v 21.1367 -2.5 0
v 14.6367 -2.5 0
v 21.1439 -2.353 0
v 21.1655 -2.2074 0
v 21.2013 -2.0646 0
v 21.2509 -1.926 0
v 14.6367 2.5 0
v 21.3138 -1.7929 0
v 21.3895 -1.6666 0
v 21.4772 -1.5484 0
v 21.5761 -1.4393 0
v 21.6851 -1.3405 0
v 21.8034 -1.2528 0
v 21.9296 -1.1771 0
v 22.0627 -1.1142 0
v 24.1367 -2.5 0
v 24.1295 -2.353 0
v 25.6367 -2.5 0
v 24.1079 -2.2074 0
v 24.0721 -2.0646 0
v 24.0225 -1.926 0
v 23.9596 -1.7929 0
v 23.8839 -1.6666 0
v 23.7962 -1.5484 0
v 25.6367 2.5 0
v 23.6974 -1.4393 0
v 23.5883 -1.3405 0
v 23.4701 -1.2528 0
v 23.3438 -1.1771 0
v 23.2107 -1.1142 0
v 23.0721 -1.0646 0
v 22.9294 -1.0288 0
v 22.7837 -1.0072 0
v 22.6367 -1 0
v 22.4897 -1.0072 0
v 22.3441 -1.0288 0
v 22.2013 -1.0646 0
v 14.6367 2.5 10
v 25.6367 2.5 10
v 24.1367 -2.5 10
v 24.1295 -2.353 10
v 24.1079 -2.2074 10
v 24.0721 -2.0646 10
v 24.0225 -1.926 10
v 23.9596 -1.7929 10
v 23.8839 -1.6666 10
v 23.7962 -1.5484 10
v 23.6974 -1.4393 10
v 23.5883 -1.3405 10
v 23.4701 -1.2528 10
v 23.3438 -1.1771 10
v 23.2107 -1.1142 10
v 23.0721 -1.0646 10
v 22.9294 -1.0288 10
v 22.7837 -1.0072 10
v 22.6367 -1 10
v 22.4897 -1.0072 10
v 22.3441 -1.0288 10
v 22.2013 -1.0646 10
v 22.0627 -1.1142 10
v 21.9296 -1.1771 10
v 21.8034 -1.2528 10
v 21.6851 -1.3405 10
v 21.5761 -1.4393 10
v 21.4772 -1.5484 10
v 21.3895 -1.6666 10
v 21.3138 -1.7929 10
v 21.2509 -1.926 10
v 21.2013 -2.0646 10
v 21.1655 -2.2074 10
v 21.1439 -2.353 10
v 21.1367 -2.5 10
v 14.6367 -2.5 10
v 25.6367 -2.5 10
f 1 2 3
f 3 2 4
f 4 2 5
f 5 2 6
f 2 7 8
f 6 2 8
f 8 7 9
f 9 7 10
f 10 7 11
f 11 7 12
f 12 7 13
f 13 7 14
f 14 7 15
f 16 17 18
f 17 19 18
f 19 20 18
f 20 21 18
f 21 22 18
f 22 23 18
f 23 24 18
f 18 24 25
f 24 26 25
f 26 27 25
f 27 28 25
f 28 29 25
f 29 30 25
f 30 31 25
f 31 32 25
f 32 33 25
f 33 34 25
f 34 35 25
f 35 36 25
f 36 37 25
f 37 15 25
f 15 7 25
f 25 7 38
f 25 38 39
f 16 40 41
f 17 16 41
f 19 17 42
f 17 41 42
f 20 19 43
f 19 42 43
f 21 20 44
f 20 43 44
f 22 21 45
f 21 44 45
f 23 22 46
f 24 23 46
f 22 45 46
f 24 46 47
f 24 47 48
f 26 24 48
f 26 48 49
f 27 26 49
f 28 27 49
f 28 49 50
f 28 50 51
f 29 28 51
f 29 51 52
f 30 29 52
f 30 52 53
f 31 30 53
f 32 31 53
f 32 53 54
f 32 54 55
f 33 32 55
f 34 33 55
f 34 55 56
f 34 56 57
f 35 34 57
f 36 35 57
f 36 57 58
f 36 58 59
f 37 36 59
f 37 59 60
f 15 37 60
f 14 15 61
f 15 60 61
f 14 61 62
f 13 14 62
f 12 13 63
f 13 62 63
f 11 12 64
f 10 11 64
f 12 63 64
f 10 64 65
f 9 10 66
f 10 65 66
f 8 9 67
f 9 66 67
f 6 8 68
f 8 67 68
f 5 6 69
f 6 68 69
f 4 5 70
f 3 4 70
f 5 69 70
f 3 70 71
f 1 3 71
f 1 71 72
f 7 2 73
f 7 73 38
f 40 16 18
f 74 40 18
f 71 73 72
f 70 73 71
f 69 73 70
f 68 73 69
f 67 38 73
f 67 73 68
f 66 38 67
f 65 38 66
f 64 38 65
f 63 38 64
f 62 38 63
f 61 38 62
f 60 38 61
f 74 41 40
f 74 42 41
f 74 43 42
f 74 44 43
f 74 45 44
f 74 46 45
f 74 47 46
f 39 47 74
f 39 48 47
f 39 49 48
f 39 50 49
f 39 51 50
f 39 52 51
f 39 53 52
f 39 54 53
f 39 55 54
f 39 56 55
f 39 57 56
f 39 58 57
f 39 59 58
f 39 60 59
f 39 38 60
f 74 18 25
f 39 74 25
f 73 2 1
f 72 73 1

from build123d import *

# Parameters (mm, degrees)
F0_W     = 11
F0_H     = 5
F1_DEPTH = 10
F3_DEPTH = 10.001


with BuildPart() as f1:
    # F0 (on Top) → F1 (new body)
    with BuildSketch(Plane.XY):
        with Locations((20.1367214707, 0)):
            Rectangle(F0_W, F0_H)
    extrude(amount=F1_DEPTH)

    # F2 (on face) → F3 (cut, through all)
    with BuildSketch(Plane.XY.offset(10)):
        with BuildLine():
            Line((21.1367214707, -2.5), (24.1367214707, -2.5))
            ThreePointArc((24.1367214707, -2.5), (22.6367214707, -1), (21.1367214707, -2.5))
        make_face()
    extrude(amount=-F3_DEPTH, mode=Mode.SUBTRACT)


solid = f1.part
